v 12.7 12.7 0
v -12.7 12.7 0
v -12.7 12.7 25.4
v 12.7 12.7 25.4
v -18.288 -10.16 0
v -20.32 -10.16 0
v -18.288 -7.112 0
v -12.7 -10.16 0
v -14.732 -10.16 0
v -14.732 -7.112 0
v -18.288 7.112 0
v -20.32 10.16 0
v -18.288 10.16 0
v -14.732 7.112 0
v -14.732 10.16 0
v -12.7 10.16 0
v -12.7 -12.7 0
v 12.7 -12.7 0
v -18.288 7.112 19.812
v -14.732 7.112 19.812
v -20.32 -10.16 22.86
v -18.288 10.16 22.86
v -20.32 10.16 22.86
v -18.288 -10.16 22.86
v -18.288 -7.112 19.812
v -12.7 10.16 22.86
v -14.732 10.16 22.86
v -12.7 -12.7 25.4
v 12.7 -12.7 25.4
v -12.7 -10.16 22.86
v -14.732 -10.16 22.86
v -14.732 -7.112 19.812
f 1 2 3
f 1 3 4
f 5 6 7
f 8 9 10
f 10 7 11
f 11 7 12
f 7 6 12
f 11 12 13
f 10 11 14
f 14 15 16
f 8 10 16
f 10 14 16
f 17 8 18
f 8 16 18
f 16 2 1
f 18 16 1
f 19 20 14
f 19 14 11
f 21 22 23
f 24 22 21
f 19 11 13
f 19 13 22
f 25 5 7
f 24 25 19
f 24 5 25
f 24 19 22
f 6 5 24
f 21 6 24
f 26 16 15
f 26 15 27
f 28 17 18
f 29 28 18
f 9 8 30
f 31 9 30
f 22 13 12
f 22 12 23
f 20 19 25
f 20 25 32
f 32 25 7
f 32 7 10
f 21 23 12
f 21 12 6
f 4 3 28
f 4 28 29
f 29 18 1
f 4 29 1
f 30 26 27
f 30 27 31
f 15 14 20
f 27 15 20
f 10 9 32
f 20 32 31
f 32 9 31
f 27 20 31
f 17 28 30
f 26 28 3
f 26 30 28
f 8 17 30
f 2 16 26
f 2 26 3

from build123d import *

# Parameters (mm, degrees)
F0_W     = 25.4
F0_H     = 25.4
F1_DEPTH = 25.4
F2_W     = 20.32
F2_H     = 22.86
F3_DEPTH = 7.62
F4_W     = 3.556
F4_H     = 20.32
F5_DEPTH = 3.048
F6_W     = 3.556
F6_H     = 19.812
F7_DEPTH = 3.048
F8_W     = 3.556
F8_H     = 19.812
F9_DEPTH = 3.048


with BuildPart() as f1:
    # F0 (on Top) → F1 (new body)
    with BuildSketch(Plane.XY):
        Rectangle(F0_W, F0_H)
    extrude(amount=F1_DEPTH)

    # F2 (on face) → F3 (join)
    with BuildSketch(Plane(origin=(-12.7, 0, 0), x_dir=(0, -1, 0), z_dir=(-1, 0, 0))):
        with Locations((0, 11.43)):
            Rectangle(F2_W, F2_H)
    extrude(amount=F3_DEPTH)

    # F4 (on face) → F5 (cut)
    with BuildSketch(Plane.XY.offset(22.86)):
        with Locations((-16.51, 0)):
            Rectangle(F4_W, F4_H)
    extrude(amount=-F5_DEPTH, mode=Mode.SUBTRACT)

    # F6 (on face) → F7 (cut)
    with BuildSketch(Plane.XZ.offset(10.16)):
        with Locations((-16.51, 9.906)):
            Rectangle(F6_W, F6_H)
    extrude(amount=-F7_DEPTH, mode=Mode.SUBTRACT)

    # F8 (on face) → F9 (cut)
    with BuildSketch(Plane(origin=(0, 10.16, 0), x_dir=(-1, 0, 0), z_dir=(0, 1, 0))):
        with Locations((16.51, 9.906)):
            Rectangle(F8_W, F8_H)
    extrude(amount=-F9_DEPTH, mode=Mode.SUBTRACT)


with BuildPart() as f10_1:
    # F10: copy of F1
    add(f1.part.moved(Location((-54.102, 0, 0))))


solid = f1.part
